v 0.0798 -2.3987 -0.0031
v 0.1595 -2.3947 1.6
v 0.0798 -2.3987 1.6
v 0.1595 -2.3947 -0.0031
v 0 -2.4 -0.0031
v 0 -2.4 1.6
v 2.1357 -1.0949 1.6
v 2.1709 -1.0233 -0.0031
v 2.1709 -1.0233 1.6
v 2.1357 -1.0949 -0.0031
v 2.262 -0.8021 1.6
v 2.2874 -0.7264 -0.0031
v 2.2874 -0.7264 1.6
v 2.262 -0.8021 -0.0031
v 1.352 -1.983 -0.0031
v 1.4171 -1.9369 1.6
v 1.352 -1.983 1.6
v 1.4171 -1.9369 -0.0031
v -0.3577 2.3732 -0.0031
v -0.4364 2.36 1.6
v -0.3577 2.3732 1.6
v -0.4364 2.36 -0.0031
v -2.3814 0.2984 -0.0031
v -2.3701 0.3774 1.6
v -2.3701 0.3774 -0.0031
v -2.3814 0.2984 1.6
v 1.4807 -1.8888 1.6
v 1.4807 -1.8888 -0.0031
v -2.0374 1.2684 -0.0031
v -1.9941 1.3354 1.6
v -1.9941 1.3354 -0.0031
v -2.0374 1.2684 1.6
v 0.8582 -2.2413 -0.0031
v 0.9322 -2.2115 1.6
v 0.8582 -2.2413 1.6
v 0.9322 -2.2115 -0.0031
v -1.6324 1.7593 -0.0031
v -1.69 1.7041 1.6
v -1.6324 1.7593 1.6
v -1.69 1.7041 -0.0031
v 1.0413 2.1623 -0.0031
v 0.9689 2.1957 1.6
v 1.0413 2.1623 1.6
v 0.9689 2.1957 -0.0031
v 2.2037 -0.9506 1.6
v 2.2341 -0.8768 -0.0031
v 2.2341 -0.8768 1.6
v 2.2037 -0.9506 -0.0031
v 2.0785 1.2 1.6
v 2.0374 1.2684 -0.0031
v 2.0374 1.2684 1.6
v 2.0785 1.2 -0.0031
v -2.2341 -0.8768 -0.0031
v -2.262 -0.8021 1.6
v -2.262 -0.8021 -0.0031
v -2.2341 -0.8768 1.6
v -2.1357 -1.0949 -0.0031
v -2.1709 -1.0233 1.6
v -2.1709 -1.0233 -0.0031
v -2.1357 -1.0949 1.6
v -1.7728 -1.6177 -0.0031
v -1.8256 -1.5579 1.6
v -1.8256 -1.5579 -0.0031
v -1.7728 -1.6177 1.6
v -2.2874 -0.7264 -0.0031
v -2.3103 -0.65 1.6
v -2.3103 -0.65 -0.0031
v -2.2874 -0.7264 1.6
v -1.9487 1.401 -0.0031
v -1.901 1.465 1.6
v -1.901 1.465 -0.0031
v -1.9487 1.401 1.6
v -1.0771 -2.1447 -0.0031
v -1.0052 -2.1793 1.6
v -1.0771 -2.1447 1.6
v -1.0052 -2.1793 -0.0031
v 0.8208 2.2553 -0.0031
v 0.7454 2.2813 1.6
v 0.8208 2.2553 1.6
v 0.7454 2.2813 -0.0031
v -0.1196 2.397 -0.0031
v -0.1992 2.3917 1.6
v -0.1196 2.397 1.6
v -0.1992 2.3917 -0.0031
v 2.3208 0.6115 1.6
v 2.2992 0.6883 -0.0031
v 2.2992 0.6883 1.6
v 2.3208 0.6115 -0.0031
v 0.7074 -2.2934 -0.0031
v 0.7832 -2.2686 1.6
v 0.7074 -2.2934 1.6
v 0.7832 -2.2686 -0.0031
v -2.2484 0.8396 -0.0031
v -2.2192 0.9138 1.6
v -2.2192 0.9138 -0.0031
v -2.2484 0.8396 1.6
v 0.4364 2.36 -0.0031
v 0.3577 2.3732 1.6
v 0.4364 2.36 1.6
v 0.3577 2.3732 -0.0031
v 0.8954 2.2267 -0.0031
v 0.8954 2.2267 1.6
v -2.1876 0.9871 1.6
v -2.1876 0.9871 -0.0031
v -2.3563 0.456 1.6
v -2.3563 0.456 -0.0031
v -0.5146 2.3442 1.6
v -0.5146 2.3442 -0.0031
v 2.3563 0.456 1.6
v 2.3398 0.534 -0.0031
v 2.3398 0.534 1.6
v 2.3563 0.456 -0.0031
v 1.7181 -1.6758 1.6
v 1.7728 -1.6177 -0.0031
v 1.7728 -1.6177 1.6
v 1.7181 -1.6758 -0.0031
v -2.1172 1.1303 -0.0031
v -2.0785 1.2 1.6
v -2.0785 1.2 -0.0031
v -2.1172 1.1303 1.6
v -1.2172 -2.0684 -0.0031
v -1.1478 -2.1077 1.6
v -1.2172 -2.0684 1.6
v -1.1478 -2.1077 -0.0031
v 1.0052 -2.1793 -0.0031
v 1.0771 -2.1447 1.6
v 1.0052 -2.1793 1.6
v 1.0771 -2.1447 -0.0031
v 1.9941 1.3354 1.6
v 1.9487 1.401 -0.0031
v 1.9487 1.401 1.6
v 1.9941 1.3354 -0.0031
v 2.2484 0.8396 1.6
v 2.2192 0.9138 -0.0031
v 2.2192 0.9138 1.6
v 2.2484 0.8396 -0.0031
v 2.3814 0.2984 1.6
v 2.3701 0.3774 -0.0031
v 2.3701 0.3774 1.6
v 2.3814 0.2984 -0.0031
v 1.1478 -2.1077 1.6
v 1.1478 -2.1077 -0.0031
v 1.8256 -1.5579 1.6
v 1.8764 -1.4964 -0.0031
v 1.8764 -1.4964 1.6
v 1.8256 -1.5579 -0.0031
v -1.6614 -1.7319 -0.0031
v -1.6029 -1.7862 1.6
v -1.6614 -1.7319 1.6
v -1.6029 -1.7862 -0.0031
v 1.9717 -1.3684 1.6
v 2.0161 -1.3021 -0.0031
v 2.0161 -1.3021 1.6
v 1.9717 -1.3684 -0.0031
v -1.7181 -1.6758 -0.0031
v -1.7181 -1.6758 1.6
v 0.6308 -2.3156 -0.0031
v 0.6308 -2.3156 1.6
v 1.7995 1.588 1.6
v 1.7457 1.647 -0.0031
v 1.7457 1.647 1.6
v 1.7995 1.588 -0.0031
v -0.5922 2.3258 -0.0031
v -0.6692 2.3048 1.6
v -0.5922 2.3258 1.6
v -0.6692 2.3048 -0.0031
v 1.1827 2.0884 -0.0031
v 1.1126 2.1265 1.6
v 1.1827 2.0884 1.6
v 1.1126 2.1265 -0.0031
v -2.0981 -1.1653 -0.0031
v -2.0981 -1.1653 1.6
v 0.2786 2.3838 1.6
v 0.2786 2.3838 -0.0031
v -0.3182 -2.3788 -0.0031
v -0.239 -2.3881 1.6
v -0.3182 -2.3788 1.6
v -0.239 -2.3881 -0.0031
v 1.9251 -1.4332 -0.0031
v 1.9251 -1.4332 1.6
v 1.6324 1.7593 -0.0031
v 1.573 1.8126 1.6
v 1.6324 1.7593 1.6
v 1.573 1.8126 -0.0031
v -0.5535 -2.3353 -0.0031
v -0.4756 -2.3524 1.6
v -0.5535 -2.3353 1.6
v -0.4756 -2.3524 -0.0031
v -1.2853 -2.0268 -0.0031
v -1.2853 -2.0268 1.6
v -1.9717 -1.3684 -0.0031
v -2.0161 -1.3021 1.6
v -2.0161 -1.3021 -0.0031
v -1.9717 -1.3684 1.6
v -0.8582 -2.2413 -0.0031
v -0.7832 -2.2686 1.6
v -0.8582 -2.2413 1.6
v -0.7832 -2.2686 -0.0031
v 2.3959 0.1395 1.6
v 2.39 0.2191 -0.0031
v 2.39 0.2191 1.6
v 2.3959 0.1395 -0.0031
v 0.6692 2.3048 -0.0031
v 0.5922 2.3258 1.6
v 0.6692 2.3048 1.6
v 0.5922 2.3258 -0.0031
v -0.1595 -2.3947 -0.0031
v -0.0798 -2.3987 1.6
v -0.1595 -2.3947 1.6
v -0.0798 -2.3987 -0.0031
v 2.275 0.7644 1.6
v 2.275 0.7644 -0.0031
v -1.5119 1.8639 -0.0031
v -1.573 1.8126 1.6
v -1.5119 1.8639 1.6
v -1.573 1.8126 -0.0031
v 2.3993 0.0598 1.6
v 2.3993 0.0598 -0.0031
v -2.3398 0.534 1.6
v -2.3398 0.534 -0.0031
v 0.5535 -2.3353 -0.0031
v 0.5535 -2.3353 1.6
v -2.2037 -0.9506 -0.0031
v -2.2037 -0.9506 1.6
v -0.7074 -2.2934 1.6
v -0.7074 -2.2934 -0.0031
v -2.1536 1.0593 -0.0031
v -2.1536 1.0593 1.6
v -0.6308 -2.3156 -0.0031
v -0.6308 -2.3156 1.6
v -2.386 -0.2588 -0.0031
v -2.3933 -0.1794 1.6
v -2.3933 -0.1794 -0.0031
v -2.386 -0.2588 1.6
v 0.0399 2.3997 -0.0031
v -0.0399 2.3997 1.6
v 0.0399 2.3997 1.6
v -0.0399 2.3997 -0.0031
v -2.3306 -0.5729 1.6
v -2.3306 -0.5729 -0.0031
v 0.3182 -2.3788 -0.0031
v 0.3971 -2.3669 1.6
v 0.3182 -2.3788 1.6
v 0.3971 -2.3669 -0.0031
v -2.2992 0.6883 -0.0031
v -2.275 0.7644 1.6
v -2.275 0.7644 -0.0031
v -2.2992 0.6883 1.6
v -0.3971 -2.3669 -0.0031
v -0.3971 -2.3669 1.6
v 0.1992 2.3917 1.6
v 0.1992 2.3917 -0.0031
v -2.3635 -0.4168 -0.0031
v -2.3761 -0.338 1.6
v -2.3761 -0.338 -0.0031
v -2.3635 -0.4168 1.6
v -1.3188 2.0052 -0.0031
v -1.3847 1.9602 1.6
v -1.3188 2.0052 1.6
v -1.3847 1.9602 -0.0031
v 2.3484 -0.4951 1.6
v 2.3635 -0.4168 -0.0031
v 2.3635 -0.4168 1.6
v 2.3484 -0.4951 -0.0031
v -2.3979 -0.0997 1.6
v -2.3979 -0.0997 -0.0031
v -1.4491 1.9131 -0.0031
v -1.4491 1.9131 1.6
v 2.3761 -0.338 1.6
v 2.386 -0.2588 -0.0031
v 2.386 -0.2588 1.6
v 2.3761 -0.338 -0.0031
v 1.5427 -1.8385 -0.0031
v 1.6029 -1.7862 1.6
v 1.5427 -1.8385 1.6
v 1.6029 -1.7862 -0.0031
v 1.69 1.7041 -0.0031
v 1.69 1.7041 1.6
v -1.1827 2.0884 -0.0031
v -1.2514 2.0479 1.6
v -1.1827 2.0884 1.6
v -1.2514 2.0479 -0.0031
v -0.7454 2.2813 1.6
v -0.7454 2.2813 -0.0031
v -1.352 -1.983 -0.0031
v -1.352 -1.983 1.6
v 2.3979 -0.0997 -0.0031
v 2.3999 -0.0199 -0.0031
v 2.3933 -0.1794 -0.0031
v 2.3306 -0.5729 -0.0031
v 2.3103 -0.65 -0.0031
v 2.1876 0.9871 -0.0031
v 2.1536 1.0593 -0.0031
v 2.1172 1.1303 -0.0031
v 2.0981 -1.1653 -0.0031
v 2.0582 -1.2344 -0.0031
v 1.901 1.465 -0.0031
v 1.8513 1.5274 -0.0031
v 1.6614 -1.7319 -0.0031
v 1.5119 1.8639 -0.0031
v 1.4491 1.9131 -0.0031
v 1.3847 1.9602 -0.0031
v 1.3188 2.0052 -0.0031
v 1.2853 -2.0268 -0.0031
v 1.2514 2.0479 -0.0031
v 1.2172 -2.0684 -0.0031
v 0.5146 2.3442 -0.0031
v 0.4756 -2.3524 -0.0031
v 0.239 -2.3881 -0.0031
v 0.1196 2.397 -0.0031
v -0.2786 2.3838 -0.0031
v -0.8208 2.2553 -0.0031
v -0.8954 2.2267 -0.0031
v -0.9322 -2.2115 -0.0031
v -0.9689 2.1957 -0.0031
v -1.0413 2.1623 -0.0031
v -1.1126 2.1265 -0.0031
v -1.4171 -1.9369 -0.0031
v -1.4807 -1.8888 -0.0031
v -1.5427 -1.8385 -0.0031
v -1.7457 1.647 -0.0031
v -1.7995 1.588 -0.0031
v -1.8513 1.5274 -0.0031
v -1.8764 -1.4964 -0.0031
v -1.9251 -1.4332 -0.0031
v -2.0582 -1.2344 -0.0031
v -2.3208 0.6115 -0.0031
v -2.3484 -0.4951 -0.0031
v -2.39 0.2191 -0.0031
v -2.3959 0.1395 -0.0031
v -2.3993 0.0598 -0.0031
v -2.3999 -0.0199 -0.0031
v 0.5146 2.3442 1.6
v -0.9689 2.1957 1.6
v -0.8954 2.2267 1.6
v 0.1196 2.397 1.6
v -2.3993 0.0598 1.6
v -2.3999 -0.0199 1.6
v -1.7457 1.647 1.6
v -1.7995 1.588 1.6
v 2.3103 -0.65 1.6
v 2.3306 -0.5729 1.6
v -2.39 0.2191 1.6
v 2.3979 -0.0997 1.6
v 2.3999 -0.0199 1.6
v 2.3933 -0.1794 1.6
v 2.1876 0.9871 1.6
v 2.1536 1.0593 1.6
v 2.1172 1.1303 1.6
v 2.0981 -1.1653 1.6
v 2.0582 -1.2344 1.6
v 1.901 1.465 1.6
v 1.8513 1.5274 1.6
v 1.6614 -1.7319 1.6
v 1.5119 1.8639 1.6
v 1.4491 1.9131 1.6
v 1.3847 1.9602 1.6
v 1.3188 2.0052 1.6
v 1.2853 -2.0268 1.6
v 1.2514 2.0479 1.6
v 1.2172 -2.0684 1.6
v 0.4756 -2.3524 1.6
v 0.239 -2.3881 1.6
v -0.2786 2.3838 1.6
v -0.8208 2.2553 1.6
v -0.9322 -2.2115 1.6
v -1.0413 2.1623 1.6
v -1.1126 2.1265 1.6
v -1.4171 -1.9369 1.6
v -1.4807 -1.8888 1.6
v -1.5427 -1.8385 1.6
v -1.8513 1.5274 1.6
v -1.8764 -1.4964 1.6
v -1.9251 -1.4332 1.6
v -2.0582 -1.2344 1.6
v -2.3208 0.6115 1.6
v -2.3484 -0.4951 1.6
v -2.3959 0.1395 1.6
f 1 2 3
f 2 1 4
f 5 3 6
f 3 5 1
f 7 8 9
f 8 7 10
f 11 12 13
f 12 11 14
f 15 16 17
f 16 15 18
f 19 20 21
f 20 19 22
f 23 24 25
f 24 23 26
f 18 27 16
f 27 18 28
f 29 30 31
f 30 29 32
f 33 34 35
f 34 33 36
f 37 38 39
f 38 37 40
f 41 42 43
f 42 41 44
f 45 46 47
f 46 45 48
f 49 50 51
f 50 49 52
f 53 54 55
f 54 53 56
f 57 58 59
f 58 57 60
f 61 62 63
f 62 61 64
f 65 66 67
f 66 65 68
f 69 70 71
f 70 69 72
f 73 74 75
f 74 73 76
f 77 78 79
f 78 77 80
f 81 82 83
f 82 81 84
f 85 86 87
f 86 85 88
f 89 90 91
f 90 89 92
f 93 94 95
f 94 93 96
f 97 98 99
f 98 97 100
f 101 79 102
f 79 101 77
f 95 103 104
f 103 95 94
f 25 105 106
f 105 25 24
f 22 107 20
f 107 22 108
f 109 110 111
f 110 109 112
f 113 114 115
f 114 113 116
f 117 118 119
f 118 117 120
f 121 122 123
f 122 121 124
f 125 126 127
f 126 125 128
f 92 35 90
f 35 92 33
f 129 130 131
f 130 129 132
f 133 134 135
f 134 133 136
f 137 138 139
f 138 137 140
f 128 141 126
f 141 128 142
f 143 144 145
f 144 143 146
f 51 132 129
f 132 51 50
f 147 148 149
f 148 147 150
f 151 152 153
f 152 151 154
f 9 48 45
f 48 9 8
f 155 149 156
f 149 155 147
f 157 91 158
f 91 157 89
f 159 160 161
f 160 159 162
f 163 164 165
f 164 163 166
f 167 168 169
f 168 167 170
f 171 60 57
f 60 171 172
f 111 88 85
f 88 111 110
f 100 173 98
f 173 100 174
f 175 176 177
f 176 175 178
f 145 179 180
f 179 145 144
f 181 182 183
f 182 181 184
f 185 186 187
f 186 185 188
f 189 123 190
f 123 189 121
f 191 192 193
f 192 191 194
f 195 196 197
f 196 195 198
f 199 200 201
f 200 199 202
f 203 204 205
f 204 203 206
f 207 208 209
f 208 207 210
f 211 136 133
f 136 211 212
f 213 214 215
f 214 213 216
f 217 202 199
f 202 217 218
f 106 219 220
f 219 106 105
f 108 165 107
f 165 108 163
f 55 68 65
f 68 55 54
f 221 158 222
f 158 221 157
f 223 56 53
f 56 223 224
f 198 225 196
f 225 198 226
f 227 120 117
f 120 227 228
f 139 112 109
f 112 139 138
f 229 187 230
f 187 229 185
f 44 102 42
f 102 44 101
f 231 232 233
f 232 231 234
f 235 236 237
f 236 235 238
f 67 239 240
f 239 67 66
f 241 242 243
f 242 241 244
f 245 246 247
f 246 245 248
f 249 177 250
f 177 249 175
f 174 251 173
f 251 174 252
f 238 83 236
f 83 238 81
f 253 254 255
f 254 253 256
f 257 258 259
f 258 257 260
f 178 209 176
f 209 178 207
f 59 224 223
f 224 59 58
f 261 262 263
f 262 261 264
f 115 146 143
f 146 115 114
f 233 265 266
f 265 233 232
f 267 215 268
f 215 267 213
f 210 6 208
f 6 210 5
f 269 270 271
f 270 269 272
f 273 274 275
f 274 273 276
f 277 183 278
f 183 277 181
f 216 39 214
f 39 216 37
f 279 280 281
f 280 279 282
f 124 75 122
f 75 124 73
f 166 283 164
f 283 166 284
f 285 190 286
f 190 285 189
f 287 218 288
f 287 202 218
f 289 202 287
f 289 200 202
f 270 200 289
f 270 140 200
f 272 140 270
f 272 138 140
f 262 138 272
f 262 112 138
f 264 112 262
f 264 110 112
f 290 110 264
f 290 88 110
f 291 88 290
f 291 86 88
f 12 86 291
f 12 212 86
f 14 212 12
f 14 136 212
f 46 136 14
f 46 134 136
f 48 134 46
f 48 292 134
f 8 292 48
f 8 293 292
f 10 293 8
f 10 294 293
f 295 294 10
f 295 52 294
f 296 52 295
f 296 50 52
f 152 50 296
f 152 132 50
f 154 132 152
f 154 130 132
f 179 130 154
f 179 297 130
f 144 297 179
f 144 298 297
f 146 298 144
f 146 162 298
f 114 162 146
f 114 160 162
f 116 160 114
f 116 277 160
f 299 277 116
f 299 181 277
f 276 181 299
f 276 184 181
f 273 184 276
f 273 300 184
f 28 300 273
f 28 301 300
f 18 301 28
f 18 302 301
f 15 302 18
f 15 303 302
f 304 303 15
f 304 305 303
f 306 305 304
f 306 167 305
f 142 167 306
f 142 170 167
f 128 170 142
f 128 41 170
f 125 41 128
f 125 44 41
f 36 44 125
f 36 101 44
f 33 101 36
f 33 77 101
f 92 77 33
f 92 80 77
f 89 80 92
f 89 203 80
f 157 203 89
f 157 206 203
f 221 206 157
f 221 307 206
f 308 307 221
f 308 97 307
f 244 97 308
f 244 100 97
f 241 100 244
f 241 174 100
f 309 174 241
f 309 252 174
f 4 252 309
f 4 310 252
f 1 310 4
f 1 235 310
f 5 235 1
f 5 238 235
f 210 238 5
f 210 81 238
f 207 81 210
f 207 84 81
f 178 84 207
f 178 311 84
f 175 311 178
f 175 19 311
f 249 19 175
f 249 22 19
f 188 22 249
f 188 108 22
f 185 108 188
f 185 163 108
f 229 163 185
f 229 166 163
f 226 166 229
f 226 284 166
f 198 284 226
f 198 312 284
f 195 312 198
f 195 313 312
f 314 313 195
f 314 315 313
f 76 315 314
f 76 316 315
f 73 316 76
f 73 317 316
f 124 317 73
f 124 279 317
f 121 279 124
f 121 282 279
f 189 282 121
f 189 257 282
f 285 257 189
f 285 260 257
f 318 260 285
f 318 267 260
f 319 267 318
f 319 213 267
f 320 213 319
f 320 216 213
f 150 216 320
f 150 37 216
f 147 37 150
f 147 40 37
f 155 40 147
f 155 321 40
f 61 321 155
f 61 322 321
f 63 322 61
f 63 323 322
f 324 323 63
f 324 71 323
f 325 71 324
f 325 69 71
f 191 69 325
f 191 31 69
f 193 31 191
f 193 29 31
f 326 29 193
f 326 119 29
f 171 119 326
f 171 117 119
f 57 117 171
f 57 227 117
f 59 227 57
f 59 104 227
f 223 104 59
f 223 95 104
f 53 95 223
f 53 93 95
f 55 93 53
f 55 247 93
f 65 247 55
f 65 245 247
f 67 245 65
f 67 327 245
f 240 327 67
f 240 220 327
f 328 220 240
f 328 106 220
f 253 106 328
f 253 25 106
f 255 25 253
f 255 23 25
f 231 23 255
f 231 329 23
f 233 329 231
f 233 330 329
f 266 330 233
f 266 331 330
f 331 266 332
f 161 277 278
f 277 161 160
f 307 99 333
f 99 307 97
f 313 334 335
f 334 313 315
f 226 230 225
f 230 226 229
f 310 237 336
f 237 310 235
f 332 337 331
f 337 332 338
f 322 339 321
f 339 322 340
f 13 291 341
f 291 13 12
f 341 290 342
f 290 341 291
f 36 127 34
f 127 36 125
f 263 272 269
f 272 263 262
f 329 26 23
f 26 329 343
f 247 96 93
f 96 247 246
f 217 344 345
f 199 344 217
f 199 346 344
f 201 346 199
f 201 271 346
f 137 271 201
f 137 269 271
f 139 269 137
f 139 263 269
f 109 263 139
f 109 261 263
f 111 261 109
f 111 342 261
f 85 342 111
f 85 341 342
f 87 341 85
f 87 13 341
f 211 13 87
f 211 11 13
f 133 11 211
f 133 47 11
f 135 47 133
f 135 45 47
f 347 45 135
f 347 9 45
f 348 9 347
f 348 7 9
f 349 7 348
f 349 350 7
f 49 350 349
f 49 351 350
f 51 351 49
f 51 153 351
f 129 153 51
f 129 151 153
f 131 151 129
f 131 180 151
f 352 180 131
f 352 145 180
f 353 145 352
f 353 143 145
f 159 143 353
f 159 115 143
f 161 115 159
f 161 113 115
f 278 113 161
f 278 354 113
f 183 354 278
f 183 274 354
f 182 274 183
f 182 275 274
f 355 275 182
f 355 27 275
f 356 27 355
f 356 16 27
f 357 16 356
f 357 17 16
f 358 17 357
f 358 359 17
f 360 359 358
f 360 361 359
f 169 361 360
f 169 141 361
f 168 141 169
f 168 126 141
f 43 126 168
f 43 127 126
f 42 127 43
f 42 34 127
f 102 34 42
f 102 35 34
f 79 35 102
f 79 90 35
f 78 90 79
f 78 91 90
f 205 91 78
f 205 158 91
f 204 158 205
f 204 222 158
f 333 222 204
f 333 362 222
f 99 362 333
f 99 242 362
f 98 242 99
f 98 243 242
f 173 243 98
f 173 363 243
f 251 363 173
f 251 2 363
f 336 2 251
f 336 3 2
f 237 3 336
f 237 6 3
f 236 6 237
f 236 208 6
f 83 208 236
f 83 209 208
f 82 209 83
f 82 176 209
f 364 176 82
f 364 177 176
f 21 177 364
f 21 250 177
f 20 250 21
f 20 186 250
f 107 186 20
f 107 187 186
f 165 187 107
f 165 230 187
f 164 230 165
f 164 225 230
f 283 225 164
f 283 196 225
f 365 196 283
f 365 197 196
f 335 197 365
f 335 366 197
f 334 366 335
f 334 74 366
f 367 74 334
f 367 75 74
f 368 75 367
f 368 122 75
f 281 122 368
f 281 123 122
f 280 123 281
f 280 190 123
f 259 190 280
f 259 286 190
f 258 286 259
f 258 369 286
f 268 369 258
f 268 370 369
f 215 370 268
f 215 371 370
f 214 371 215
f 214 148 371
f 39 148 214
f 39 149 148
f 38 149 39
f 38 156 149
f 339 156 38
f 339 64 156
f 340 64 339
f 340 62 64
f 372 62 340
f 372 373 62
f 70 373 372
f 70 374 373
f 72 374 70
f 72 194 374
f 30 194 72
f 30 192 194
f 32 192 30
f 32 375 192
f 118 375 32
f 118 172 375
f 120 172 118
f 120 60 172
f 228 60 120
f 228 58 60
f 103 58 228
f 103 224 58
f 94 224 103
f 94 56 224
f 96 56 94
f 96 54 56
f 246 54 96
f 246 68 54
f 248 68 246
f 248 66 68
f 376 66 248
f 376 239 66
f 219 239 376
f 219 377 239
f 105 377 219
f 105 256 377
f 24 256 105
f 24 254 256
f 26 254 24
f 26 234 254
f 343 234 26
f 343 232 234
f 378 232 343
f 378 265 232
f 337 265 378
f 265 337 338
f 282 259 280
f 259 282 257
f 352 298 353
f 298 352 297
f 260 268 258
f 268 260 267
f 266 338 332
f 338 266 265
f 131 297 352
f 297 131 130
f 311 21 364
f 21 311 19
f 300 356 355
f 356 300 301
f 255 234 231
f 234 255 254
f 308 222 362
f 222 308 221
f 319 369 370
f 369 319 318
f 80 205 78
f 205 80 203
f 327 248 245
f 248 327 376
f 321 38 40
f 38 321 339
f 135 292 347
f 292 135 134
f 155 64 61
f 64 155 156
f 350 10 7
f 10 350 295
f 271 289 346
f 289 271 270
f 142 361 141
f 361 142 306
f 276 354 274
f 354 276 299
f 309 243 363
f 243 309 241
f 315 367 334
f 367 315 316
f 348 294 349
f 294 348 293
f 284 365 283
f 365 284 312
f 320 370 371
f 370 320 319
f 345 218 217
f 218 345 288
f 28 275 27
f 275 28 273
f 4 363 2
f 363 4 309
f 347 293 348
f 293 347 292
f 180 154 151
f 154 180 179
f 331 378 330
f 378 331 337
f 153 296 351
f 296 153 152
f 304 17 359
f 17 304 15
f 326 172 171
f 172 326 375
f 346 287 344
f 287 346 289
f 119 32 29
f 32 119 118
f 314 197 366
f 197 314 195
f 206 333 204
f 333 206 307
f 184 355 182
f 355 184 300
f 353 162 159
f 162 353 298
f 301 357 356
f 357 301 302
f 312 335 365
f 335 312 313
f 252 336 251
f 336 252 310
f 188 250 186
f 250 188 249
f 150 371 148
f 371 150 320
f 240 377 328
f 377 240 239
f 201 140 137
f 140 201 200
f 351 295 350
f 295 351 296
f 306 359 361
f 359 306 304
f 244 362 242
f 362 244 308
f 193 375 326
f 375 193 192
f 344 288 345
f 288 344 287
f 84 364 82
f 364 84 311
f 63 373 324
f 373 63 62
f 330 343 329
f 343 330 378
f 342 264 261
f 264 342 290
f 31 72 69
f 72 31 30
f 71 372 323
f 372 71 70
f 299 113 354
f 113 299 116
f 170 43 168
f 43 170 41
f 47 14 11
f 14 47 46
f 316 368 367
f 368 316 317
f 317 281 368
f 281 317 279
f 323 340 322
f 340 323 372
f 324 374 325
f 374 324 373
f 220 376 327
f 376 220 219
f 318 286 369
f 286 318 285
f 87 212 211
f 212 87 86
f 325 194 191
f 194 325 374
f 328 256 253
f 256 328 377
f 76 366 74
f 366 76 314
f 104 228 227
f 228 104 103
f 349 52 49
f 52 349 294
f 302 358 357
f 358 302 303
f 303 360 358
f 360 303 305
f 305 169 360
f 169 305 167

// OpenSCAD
use <../lib.scad>
use <3195p01.scad>
$fa=1; $fs=0.2;
function ldraw_lib__3193p01(realsolid=false) = [
// 0 ~Moved to 3195p01
// 0 Name: 3193p01.dat
// 0 Author: [PTadmin]
// 0 !LDRAW_ORG Part UPDATE 1999-02
// 0 !LICENSE Licensed under CC BY 4.0 : see CAreadme.txt
// 
// 0 BFC CERTIFY CCW
  [0,"BFC","CERTIFY"],
  [0,"BFC","CCW"],
// 
// 0 !HISTORY 1999-03-26 [PTadmin] Official Update 1999-02
// 0 !HISTORY 2007-06-24 [PTadmin] Header formatted for Contributor Agreement
// 0 !HISTORY 2008-07-01 [PTadmin] Official Update 2008-01
// 
// 
// 1 16 0 0 0 1 0 0 0 1 0 0 0 1 3195p01.dat
  [1,16,0,0,0,1,0,0,0,1,0,0,0,1, ldraw_lib__3195p01(realsolid)],
];
module ldraw_lib__3193p01(step=0, col=false, unit=2/5, alt=false, line=0.2, solid=!$preview)
    makepoly(ldraw_lib__3193p01(solid), step=step, col=col, unit=unit, alt=alt, line=line, solid=solid);
ldraw_lib__3193p01(line=0.2);
